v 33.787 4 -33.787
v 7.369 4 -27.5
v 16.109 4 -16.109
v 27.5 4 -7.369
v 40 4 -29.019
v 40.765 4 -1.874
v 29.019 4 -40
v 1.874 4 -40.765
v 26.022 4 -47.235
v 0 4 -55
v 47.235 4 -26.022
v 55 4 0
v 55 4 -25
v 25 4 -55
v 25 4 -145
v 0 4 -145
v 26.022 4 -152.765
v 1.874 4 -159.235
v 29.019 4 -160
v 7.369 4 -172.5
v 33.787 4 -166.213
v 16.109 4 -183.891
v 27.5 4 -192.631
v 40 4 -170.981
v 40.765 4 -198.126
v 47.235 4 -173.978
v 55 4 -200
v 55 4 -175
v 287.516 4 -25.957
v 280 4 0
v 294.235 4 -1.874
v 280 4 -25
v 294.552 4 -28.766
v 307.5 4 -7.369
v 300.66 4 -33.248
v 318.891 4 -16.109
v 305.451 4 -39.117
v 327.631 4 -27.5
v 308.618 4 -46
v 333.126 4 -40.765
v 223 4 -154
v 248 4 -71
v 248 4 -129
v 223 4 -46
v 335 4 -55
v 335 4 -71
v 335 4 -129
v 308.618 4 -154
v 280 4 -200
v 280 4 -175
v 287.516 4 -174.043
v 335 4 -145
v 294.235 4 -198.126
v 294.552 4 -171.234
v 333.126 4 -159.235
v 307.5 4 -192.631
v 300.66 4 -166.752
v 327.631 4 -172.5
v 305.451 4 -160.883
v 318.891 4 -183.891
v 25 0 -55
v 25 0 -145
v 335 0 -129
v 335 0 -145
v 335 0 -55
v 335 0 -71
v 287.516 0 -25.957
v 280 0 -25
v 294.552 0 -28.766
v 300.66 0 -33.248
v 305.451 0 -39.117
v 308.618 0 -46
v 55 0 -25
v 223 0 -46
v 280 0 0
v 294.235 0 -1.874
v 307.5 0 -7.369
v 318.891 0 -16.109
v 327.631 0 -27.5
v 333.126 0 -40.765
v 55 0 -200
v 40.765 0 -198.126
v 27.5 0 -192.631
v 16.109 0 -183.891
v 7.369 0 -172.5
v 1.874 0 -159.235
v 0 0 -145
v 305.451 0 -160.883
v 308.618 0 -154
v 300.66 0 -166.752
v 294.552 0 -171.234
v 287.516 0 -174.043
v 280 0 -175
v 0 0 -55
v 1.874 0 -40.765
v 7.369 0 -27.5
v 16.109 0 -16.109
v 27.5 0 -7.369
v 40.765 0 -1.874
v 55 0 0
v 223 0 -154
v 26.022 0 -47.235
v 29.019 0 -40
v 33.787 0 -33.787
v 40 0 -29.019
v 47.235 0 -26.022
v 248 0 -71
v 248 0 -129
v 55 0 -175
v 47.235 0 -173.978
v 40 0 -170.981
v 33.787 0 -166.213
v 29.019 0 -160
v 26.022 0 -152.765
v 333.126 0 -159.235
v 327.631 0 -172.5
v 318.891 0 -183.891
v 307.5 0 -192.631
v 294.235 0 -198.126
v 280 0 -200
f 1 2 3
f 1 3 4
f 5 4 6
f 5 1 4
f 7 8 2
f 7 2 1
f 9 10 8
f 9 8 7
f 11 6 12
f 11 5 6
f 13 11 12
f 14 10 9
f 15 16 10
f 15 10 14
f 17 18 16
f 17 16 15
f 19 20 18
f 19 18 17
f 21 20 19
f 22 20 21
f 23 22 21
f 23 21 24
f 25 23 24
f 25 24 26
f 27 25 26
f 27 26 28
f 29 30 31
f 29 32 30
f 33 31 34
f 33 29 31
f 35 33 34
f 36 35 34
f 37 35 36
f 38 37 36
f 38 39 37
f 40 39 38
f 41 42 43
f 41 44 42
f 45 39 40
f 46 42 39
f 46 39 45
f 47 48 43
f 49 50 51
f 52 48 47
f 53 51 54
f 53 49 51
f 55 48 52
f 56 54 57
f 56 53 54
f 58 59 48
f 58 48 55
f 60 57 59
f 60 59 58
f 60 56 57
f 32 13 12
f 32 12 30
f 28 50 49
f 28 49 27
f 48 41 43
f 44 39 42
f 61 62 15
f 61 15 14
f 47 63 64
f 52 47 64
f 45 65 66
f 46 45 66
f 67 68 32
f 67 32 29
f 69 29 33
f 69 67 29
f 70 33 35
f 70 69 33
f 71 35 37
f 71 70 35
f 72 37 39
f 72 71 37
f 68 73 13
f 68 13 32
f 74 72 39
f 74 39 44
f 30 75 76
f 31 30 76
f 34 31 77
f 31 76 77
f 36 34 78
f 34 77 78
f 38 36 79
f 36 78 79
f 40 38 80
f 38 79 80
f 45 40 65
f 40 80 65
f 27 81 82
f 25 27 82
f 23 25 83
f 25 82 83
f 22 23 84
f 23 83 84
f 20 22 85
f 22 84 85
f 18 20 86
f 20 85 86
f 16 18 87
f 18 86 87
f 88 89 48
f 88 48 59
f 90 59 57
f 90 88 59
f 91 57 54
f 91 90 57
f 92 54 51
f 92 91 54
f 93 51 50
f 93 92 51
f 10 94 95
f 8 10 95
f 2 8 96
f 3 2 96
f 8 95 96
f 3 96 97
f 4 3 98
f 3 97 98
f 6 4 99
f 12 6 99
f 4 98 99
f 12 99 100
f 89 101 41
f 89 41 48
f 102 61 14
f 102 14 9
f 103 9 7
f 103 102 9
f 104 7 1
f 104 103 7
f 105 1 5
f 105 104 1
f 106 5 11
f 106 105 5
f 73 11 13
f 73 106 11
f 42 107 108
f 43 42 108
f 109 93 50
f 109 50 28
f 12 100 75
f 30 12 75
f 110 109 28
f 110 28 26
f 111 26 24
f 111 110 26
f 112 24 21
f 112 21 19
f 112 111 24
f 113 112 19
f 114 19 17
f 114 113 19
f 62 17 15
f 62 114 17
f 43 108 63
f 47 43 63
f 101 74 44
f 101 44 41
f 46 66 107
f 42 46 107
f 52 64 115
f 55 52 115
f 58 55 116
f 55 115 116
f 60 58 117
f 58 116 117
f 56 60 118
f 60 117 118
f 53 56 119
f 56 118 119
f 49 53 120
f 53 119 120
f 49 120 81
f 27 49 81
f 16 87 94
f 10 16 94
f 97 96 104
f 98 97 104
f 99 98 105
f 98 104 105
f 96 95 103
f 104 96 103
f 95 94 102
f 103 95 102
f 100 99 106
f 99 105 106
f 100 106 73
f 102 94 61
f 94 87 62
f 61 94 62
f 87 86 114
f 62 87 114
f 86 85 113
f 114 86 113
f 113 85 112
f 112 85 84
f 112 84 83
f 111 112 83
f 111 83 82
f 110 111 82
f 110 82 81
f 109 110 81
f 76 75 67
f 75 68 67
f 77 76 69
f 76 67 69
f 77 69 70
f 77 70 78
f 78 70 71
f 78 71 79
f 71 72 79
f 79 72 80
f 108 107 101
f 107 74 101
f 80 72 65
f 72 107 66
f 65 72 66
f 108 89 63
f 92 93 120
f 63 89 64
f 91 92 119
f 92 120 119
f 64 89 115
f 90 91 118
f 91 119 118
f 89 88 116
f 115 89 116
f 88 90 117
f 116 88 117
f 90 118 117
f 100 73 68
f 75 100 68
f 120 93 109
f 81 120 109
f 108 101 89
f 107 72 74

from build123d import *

# Parameters (mm, degrees)
BOSS_EXTRUDE1_DEPTH = 4


with BuildPart() as part:
    # Sketch1 → Boss-Extrude1 (new body)
    with BuildSketch(Plane(origin=(0, 0, 0), x_dir=(1, 0, 0), z_dir=(0, 1, 0))):
        with BuildLine():
            Line((55, 0), (280, 0))
            ThreePointArc((280, 0), (318.890872965, 16.109127035), (335, 55))
            Line((335, 55), (335, 71))
            Line((335, 71), (248, 71))
            Line((248, 71), (248, 129))
            Line((248, 129), (335, 129))
            Line((335, 129), (335, 145))
            ThreePointArc((335, 145), (318.890872965, 183.890872965), (280, 200))
            Line((280, 200), (55, 200))
            ThreePointArc((55, 200), (16.109127035, 183.890872965), (0, 145))
            Line((0, 145), (0, 55))
            ThreePointArc((0, 55), (16.109127035, 16.109127035), (55, 0))
        make_face()
        with BuildLine():
            Line((55, 25), (280, 25))
            ThreePointArc((280, 25), (297.748239349, 30.813226755), (308.618176043, 46))
            Line((308.618176043, 46), (223, 46))
            Line((223, 46), (223, 154))
            Line((223, 154), (308.618176043, 154))
            ThreePointArc((308.618176043, 154), (297.748239349, 169.186773245), (280, 175))
            Line((280, 175), (55, 175))
            ThreePointArc((55, 175), (33.786796564, 166.213203436), (25, 145))
            Line((25, 145), (25, 55))
            ThreePointArc((25, 55), (33.786796564, 33.786796564), (55, 25))
        make_face(mode=Mode.SUBTRACT)
    extrude(amount=BOSS_EXTRUDE1_DEPTH)


solid = part.part
